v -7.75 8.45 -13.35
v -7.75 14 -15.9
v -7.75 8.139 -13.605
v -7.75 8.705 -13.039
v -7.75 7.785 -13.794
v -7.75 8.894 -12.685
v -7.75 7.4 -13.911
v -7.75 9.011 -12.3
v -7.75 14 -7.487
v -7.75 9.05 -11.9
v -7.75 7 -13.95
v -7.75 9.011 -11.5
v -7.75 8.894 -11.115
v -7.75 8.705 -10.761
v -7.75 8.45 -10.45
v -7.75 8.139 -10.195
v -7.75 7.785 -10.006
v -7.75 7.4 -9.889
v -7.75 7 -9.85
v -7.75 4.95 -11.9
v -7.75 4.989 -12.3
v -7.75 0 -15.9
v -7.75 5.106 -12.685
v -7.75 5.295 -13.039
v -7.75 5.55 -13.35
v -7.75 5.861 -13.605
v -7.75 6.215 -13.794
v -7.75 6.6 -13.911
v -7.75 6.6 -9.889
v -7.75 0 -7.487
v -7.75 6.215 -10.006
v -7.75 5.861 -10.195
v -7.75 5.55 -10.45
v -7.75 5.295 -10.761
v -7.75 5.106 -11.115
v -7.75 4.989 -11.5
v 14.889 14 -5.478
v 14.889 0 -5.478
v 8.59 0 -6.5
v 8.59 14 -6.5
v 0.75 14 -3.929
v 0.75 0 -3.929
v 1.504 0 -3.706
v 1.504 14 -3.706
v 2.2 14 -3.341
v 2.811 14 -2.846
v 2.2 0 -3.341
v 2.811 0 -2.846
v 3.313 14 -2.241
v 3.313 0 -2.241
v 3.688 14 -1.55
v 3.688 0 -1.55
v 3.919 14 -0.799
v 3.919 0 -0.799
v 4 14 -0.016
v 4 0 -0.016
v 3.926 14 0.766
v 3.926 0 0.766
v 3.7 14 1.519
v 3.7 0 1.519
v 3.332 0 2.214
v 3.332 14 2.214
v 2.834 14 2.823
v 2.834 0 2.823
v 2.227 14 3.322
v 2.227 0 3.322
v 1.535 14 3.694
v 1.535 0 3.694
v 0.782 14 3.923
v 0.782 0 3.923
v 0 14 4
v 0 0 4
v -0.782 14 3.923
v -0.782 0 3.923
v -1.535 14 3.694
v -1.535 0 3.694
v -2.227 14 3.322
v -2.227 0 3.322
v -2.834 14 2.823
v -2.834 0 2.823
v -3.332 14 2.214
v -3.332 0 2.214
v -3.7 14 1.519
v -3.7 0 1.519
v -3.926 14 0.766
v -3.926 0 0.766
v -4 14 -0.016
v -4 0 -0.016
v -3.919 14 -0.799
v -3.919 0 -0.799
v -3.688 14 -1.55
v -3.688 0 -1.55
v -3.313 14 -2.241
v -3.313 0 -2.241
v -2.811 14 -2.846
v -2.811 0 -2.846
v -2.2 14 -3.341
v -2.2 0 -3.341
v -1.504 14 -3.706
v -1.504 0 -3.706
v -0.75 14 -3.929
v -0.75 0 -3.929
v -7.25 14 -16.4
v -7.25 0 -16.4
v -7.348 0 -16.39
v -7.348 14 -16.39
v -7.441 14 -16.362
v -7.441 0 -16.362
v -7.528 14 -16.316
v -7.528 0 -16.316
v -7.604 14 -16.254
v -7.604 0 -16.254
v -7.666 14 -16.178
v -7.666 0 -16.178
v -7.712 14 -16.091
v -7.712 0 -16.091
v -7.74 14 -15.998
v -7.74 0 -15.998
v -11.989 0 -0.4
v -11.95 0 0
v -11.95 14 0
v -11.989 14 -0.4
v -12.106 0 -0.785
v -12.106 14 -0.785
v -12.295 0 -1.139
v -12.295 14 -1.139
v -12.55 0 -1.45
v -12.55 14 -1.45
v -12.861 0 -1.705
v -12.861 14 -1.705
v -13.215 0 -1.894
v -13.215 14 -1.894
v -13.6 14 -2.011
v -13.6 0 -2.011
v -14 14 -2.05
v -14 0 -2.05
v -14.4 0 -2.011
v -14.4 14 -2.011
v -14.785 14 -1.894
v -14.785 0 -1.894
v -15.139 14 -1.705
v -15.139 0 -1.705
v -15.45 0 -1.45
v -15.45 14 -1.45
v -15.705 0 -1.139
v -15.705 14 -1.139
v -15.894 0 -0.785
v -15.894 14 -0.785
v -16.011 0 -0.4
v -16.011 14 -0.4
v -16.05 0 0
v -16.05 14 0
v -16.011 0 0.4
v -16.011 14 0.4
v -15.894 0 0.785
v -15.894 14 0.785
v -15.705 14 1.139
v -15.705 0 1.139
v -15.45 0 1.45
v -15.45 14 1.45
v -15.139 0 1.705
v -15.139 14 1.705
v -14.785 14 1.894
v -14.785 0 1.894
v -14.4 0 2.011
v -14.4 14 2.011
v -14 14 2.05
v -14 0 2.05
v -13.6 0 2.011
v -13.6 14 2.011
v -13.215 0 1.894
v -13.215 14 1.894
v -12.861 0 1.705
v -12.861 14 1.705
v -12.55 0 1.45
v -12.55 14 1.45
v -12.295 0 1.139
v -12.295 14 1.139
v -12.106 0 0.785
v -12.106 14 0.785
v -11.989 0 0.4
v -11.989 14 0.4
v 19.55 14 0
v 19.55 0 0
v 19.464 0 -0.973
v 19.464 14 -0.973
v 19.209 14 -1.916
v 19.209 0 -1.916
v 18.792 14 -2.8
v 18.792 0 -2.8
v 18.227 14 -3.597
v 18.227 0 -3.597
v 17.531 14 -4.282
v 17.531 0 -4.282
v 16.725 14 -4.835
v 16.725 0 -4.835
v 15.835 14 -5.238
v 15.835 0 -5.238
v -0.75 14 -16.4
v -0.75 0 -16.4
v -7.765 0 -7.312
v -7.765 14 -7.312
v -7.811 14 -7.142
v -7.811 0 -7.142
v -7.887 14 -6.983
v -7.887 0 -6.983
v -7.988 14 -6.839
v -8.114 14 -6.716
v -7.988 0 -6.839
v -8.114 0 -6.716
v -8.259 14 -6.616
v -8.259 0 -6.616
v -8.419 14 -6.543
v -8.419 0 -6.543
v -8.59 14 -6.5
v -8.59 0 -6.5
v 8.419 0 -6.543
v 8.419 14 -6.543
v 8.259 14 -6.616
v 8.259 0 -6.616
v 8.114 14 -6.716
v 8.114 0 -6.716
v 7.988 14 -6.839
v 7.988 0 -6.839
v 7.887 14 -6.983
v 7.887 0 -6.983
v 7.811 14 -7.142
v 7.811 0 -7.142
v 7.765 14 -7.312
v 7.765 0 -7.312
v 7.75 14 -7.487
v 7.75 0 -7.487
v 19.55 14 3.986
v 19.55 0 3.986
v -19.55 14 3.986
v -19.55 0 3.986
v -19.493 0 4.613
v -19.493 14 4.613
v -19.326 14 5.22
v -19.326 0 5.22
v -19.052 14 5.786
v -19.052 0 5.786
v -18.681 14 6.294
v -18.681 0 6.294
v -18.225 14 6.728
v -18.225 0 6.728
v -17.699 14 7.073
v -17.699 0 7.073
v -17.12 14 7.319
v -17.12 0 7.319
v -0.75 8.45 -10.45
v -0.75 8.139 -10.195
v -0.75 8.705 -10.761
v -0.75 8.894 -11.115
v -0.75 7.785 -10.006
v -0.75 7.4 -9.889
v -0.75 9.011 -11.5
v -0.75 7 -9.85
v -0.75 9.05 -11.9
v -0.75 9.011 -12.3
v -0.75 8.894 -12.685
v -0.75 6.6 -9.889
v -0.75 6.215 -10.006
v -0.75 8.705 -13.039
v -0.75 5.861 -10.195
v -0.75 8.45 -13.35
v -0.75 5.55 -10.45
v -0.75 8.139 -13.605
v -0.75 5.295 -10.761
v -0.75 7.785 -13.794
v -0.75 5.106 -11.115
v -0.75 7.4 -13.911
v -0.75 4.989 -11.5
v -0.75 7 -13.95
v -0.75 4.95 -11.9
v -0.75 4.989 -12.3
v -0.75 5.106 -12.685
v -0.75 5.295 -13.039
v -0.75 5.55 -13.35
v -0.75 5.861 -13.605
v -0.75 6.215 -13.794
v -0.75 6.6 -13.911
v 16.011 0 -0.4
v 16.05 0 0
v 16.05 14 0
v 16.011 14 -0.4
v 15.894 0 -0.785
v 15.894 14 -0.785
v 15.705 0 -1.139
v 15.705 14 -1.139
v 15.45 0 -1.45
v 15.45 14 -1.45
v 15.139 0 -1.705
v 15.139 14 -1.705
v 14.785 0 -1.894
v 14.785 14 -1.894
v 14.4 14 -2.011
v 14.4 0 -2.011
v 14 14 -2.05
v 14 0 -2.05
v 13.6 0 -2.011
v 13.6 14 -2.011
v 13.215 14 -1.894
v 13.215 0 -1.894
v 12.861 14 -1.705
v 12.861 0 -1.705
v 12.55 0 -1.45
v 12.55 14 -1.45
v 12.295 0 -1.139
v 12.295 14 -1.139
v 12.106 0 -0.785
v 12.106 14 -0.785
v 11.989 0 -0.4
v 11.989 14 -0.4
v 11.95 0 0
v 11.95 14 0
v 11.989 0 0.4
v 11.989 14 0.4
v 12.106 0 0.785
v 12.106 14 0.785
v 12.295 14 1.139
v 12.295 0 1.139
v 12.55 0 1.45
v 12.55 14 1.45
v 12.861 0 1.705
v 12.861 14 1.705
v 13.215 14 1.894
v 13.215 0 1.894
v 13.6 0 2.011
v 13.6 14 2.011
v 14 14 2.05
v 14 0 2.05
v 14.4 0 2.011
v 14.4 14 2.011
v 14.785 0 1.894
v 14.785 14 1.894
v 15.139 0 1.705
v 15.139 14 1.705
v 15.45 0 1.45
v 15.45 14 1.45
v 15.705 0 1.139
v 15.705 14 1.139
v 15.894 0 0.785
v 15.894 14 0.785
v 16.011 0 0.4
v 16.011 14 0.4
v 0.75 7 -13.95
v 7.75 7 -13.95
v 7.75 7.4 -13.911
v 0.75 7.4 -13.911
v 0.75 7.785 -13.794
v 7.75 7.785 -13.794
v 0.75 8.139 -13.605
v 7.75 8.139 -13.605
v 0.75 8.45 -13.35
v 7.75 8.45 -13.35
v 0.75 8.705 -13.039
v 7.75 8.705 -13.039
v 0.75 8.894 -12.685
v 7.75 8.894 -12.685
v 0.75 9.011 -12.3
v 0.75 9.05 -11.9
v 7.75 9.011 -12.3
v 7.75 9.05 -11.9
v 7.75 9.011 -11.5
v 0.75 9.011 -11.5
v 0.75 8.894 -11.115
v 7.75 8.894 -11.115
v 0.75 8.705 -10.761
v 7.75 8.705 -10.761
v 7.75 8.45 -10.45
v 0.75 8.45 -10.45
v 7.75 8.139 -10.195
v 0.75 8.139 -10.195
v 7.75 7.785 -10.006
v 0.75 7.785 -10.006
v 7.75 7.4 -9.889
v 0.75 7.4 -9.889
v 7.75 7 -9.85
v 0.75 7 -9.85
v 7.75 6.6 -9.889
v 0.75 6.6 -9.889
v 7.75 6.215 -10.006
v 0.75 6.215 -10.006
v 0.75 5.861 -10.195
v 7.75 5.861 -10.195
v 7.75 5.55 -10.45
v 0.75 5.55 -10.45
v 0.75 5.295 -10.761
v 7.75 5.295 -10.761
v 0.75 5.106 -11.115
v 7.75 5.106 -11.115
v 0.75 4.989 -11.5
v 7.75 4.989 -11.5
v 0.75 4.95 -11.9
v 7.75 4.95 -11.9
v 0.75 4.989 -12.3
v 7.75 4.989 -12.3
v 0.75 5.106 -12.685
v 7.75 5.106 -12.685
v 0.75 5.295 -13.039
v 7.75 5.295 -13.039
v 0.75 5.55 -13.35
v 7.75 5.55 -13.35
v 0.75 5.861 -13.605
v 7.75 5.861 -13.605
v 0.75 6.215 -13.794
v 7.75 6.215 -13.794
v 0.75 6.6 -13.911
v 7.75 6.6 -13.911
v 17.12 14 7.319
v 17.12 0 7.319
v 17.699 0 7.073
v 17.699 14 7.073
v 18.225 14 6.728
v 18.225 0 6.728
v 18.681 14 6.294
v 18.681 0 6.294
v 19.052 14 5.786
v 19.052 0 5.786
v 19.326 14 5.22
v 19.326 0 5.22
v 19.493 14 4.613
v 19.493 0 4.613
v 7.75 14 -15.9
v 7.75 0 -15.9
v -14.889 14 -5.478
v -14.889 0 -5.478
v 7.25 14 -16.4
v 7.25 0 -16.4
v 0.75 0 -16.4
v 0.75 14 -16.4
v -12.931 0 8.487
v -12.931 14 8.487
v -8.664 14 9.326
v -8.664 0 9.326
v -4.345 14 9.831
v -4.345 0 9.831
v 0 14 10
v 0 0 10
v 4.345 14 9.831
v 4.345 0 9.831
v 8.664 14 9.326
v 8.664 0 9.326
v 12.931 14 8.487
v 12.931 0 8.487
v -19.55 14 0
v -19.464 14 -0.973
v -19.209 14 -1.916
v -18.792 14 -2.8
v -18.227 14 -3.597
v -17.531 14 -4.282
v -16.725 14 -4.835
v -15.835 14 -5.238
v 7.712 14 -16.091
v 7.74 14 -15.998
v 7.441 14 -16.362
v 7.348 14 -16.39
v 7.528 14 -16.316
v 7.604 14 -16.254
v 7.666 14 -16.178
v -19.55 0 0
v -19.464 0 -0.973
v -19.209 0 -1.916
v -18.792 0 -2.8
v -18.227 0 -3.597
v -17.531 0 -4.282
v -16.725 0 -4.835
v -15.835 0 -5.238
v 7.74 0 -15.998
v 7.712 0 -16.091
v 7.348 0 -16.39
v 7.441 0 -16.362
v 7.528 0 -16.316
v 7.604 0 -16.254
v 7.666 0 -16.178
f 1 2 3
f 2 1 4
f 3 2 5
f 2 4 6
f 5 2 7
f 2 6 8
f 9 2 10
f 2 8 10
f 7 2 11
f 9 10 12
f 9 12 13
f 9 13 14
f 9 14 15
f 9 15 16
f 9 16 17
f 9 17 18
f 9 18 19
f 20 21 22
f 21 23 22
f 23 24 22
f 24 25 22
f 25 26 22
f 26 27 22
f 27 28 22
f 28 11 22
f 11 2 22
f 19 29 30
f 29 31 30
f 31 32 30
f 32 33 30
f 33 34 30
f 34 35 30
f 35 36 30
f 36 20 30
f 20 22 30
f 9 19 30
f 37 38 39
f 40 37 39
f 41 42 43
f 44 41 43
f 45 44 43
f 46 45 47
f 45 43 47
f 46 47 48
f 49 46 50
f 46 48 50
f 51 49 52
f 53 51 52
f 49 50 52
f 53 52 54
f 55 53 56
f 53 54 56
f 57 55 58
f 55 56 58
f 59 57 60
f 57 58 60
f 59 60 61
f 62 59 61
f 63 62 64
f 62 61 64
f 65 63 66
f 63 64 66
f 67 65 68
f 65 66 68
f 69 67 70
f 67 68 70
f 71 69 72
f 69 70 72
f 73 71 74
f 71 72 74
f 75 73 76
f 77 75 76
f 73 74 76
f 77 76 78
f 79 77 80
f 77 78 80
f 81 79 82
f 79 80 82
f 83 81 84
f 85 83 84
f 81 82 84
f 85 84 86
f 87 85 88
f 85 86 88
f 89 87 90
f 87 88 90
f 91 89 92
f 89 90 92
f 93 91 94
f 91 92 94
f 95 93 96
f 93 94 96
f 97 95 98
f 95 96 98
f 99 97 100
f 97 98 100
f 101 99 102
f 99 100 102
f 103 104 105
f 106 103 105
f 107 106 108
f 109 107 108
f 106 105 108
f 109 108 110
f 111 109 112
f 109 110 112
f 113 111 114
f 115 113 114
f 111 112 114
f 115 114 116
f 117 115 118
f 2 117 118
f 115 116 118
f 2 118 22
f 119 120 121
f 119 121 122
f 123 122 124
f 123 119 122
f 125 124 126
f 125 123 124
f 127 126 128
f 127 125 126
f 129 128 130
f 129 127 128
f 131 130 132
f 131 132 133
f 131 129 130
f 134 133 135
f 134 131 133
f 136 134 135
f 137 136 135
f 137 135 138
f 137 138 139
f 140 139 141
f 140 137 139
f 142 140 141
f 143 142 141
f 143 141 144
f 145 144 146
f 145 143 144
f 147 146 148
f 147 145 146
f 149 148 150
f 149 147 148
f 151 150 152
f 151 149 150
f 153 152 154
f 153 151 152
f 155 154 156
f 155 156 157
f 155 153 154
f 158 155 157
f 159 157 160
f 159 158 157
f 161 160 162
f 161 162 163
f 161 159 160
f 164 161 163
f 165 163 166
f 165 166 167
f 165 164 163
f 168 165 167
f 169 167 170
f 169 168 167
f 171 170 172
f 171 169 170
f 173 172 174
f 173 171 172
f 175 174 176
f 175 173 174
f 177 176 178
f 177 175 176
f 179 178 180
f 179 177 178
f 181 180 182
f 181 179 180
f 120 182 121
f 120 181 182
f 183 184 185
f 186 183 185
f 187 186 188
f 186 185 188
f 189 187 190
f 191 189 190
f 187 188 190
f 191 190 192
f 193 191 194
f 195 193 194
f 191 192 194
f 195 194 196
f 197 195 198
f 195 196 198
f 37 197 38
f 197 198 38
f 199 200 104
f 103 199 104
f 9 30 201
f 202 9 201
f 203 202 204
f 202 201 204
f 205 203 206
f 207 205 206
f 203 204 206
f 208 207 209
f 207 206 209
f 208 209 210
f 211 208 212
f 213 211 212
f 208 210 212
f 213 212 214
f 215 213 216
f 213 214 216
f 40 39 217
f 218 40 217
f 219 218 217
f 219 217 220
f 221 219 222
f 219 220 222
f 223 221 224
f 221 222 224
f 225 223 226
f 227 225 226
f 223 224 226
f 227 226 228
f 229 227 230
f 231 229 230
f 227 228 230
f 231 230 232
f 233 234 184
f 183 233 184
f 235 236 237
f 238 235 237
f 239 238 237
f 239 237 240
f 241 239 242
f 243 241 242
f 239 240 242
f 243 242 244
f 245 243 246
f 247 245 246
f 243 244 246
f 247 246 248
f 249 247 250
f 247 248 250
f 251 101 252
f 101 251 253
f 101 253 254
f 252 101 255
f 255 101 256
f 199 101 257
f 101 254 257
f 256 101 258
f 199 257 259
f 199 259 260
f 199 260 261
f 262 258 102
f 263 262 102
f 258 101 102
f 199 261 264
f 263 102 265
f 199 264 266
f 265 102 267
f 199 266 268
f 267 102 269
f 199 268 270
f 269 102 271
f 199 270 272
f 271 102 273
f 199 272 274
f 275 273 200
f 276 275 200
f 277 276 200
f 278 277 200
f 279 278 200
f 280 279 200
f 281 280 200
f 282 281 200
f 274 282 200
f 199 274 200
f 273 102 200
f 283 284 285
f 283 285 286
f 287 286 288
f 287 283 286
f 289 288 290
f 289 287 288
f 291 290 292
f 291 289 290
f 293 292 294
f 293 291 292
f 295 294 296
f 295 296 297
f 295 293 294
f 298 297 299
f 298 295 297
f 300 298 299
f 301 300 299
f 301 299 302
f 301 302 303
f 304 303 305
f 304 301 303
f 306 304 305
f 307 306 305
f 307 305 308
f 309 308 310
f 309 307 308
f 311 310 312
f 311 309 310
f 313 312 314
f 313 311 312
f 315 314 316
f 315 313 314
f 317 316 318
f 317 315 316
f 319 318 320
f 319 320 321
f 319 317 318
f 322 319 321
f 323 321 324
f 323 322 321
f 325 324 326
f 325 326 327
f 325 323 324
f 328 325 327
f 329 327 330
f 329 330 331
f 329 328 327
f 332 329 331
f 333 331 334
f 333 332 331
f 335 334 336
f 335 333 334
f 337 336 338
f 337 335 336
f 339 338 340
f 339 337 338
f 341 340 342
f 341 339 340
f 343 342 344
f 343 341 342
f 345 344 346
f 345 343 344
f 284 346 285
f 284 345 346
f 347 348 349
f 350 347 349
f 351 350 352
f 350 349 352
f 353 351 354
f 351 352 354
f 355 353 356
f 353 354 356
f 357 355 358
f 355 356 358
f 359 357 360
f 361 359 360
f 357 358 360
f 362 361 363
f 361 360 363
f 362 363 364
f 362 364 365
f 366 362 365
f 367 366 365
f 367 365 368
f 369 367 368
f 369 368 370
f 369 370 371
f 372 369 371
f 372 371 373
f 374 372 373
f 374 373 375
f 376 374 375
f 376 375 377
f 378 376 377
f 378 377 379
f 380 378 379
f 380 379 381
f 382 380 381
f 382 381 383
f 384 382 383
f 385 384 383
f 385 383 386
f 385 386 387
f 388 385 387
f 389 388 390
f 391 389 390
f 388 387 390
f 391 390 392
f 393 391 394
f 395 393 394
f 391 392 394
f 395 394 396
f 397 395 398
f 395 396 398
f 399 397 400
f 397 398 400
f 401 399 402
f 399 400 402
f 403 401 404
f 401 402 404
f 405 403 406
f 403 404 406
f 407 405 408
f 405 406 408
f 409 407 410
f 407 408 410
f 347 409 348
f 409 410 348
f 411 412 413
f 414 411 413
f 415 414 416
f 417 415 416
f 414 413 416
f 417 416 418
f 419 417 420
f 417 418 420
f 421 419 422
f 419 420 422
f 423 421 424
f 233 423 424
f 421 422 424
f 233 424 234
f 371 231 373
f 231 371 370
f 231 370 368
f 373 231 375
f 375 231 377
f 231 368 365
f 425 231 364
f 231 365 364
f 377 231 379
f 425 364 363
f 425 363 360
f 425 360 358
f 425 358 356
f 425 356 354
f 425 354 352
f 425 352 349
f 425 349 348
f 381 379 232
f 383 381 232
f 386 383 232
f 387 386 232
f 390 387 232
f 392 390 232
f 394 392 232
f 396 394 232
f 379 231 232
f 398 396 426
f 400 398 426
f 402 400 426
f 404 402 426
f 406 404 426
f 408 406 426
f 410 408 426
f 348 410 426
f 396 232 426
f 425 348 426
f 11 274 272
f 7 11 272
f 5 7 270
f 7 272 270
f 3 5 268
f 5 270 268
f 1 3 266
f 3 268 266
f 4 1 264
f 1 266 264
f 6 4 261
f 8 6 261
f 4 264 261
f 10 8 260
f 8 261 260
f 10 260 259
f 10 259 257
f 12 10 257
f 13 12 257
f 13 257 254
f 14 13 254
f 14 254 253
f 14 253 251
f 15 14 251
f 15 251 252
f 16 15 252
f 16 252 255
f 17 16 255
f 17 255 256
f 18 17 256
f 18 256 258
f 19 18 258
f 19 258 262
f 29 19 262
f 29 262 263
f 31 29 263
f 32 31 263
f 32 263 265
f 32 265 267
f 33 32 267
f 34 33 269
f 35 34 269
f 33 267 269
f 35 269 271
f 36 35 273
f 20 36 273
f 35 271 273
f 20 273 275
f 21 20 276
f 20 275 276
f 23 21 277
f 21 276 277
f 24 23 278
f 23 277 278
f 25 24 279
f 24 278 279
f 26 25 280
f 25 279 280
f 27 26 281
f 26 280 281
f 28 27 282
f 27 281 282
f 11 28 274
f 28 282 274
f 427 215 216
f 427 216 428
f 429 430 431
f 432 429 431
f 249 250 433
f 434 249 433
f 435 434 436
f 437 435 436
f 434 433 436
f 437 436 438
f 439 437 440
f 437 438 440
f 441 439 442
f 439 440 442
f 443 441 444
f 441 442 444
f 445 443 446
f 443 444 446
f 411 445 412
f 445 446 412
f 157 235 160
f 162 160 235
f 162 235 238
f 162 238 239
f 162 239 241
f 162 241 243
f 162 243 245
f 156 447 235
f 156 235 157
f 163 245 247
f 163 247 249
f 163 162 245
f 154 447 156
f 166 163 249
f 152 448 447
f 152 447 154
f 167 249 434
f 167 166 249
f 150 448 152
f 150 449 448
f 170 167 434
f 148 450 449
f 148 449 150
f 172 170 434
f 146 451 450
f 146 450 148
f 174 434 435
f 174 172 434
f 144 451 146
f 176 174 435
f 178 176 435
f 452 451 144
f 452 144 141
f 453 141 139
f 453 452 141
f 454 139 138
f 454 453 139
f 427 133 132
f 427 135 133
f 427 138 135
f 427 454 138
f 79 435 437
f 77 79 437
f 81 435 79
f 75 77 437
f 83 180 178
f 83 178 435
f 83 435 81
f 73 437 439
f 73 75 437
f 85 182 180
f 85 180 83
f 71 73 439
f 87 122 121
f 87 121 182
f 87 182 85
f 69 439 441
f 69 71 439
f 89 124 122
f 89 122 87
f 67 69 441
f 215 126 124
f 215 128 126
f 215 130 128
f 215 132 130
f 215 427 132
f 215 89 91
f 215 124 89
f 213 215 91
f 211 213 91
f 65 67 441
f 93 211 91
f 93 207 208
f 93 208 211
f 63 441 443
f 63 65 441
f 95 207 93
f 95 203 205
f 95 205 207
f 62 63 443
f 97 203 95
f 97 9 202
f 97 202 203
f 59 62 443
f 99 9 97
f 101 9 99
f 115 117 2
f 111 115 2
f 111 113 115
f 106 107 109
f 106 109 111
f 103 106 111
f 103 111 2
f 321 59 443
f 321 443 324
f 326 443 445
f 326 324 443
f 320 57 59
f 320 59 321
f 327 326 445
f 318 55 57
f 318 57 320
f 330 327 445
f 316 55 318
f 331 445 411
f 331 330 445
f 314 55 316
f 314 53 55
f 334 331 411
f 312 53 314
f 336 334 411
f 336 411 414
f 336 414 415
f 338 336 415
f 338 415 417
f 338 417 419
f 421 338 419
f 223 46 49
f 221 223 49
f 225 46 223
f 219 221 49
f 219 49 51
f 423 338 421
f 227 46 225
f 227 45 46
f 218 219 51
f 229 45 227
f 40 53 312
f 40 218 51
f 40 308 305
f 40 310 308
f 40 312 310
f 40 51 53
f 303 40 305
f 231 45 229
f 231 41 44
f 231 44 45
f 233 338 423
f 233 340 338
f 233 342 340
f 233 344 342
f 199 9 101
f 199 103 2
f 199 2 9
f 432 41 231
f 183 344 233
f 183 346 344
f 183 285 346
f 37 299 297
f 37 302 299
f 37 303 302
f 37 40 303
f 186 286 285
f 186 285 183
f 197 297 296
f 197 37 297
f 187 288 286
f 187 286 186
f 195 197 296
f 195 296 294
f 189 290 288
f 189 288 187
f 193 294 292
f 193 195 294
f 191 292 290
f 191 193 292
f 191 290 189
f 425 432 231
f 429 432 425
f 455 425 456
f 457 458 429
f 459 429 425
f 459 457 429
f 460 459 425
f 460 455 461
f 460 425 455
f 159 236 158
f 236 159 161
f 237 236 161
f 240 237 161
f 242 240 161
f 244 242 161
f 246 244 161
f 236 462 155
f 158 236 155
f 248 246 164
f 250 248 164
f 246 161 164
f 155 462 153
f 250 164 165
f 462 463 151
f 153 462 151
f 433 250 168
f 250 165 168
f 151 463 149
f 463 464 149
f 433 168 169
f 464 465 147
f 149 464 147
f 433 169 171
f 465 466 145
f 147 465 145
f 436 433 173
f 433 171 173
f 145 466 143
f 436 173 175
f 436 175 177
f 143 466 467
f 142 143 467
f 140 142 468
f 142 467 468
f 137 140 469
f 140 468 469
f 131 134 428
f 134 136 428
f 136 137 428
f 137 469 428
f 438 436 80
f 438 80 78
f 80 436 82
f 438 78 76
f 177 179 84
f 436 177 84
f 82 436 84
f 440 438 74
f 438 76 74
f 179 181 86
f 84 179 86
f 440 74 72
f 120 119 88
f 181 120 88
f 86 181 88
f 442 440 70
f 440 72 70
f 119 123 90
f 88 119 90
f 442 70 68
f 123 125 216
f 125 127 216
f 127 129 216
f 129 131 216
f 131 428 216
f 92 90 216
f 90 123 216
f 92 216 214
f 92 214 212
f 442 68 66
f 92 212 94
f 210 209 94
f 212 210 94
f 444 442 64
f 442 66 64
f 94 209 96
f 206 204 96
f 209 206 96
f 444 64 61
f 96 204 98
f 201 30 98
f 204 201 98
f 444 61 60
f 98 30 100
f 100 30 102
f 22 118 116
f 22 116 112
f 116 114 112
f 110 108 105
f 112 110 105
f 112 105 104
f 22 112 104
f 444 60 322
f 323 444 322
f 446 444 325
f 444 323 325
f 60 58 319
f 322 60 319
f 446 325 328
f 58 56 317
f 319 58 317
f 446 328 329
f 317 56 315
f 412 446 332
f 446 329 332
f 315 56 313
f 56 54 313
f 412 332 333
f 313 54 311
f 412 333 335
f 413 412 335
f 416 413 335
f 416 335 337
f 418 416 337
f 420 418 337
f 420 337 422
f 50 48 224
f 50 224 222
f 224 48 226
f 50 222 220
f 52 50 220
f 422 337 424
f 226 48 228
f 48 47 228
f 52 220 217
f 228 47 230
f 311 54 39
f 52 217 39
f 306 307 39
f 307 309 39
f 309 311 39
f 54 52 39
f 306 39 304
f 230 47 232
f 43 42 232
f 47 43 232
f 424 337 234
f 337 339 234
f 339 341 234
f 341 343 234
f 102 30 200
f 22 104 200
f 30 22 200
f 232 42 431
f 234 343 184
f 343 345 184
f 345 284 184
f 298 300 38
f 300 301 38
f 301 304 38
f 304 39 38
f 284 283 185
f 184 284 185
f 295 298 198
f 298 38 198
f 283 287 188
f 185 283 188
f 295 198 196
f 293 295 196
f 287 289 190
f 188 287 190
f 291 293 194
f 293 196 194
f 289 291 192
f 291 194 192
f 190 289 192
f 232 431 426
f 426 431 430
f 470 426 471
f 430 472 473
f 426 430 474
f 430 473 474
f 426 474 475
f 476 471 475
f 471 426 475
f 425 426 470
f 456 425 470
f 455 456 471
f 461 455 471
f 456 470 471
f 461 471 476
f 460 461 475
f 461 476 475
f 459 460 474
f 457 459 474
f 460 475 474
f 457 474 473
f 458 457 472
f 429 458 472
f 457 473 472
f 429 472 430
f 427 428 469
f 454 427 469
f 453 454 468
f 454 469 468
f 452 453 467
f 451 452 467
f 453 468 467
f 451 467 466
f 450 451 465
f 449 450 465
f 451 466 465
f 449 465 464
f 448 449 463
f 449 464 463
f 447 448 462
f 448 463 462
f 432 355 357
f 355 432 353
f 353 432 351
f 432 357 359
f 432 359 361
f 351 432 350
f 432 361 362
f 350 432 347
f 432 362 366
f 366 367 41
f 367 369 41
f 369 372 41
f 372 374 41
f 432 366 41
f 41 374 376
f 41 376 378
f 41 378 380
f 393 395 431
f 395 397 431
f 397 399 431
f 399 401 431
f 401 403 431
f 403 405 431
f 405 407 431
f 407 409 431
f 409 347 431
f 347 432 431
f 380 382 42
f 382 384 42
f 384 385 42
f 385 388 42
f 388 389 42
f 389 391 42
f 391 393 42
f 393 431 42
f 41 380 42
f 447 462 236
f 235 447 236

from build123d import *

# Parameters (mm, degrees)
SKETCH1_R           = 2.05
BOSS_EXTRUDE1_DEPTH = 14
SKETCH2_R           = 2.05
CUT_EXTRUDE1_DEPTH  = 28.3


with BuildPart() as part:
    # Sketch1 → Boss-Extrude1 (new body)
    with BuildSketch(Plane(origin=(0, 0, 0), x_dir=(1, 0, 0), z_dir=(0, 1, 0))):
        with BuildLine():
            Line((-19.55, 0), (-19.55, -3.98647317))
            ThreePointArc((-19.55, -3.98647317), (-18.877985148, -6.048632233), (-17.12, -7.318904715))
            ThreePointArc((-17.12, -7.318904715), (0, -10), (17.12, -7.318904715))
            ThreePointArc((17.12, -7.318904715), (18.877985148, -6.048632233), (19.55, -3.98647317))
            Line((19.55, -3.98647317), (19.55, 0))
            ThreePointArc((19.55, 0), (18.22693576, 3.59659757), (14.888553485, 5.478409687))
            Line((14.888553485, 5.478409687), (8.589900273, 6.5))
            ThreePointArc((8.589900273, 6.5), (7.988389953, 6.839065246), (7.75, 7.487100845))
            Line((7.75, 7.487100845), (7.75, 15.9))
            ThreePointArc((7.75, 15.9), (7.603553391, 16.253553391), (7.25, 16.4))
            Line((7.25, 16.4), (0.75, 16.4))
            Line((0.75, 16.4), (0.75, 3.929058411))
            ThreePointArc((0.75, 3.929058411), (0, -4), (-0.75, 3.929058411))
            Line((-0.75, 3.929058411), (-0.75, 16.4))
            Line((-0.75, 16.4), (-7.25, 16.4))
            ThreePointArc((-7.25, 16.4), (-7.603553391, 16.253553391), (-7.75, 15.9))
            Line((-7.75, 15.9), (-7.75, 7.487100845))
            ThreePointArc((-7.75, 7.487100845), (-7.988389953, 6.839065246), (-8.589900273, 6.5))
            Line((-8.589900273, 6.5), (-14.888553485, 5.478409687))
            ThreePointArc((-14.888553485, 5.478409687), (-18.22693576, 3.59659757), (-19.55, 0))
        make_face()
        with Locations((-14, 0)):
            Circle(SKETCH1_R, mode=Mode.SUBTRACT)
        with Locations((14, 0)):
            Circle(SKETCH1_R, mode=Mode.SUBTRACT)
    extrude(amount=BOSS_EXTRUDE1_DEPTH)

    # Sketch2 → Cut-Extrude1 (cut, through all)
    with BuildSketch(Plane(origin=(7.75, 0, 0), x_dir=(0, 0, -1), z_dir=(1, 0, 0))):
        with Locations((11.9, 7)):
            Circle(SKETCH2_R)
    extrude(amount=-CUT_EXTRUDE1_DEPTH, mode=Mode.SUBTRACT)


solid = part.part
